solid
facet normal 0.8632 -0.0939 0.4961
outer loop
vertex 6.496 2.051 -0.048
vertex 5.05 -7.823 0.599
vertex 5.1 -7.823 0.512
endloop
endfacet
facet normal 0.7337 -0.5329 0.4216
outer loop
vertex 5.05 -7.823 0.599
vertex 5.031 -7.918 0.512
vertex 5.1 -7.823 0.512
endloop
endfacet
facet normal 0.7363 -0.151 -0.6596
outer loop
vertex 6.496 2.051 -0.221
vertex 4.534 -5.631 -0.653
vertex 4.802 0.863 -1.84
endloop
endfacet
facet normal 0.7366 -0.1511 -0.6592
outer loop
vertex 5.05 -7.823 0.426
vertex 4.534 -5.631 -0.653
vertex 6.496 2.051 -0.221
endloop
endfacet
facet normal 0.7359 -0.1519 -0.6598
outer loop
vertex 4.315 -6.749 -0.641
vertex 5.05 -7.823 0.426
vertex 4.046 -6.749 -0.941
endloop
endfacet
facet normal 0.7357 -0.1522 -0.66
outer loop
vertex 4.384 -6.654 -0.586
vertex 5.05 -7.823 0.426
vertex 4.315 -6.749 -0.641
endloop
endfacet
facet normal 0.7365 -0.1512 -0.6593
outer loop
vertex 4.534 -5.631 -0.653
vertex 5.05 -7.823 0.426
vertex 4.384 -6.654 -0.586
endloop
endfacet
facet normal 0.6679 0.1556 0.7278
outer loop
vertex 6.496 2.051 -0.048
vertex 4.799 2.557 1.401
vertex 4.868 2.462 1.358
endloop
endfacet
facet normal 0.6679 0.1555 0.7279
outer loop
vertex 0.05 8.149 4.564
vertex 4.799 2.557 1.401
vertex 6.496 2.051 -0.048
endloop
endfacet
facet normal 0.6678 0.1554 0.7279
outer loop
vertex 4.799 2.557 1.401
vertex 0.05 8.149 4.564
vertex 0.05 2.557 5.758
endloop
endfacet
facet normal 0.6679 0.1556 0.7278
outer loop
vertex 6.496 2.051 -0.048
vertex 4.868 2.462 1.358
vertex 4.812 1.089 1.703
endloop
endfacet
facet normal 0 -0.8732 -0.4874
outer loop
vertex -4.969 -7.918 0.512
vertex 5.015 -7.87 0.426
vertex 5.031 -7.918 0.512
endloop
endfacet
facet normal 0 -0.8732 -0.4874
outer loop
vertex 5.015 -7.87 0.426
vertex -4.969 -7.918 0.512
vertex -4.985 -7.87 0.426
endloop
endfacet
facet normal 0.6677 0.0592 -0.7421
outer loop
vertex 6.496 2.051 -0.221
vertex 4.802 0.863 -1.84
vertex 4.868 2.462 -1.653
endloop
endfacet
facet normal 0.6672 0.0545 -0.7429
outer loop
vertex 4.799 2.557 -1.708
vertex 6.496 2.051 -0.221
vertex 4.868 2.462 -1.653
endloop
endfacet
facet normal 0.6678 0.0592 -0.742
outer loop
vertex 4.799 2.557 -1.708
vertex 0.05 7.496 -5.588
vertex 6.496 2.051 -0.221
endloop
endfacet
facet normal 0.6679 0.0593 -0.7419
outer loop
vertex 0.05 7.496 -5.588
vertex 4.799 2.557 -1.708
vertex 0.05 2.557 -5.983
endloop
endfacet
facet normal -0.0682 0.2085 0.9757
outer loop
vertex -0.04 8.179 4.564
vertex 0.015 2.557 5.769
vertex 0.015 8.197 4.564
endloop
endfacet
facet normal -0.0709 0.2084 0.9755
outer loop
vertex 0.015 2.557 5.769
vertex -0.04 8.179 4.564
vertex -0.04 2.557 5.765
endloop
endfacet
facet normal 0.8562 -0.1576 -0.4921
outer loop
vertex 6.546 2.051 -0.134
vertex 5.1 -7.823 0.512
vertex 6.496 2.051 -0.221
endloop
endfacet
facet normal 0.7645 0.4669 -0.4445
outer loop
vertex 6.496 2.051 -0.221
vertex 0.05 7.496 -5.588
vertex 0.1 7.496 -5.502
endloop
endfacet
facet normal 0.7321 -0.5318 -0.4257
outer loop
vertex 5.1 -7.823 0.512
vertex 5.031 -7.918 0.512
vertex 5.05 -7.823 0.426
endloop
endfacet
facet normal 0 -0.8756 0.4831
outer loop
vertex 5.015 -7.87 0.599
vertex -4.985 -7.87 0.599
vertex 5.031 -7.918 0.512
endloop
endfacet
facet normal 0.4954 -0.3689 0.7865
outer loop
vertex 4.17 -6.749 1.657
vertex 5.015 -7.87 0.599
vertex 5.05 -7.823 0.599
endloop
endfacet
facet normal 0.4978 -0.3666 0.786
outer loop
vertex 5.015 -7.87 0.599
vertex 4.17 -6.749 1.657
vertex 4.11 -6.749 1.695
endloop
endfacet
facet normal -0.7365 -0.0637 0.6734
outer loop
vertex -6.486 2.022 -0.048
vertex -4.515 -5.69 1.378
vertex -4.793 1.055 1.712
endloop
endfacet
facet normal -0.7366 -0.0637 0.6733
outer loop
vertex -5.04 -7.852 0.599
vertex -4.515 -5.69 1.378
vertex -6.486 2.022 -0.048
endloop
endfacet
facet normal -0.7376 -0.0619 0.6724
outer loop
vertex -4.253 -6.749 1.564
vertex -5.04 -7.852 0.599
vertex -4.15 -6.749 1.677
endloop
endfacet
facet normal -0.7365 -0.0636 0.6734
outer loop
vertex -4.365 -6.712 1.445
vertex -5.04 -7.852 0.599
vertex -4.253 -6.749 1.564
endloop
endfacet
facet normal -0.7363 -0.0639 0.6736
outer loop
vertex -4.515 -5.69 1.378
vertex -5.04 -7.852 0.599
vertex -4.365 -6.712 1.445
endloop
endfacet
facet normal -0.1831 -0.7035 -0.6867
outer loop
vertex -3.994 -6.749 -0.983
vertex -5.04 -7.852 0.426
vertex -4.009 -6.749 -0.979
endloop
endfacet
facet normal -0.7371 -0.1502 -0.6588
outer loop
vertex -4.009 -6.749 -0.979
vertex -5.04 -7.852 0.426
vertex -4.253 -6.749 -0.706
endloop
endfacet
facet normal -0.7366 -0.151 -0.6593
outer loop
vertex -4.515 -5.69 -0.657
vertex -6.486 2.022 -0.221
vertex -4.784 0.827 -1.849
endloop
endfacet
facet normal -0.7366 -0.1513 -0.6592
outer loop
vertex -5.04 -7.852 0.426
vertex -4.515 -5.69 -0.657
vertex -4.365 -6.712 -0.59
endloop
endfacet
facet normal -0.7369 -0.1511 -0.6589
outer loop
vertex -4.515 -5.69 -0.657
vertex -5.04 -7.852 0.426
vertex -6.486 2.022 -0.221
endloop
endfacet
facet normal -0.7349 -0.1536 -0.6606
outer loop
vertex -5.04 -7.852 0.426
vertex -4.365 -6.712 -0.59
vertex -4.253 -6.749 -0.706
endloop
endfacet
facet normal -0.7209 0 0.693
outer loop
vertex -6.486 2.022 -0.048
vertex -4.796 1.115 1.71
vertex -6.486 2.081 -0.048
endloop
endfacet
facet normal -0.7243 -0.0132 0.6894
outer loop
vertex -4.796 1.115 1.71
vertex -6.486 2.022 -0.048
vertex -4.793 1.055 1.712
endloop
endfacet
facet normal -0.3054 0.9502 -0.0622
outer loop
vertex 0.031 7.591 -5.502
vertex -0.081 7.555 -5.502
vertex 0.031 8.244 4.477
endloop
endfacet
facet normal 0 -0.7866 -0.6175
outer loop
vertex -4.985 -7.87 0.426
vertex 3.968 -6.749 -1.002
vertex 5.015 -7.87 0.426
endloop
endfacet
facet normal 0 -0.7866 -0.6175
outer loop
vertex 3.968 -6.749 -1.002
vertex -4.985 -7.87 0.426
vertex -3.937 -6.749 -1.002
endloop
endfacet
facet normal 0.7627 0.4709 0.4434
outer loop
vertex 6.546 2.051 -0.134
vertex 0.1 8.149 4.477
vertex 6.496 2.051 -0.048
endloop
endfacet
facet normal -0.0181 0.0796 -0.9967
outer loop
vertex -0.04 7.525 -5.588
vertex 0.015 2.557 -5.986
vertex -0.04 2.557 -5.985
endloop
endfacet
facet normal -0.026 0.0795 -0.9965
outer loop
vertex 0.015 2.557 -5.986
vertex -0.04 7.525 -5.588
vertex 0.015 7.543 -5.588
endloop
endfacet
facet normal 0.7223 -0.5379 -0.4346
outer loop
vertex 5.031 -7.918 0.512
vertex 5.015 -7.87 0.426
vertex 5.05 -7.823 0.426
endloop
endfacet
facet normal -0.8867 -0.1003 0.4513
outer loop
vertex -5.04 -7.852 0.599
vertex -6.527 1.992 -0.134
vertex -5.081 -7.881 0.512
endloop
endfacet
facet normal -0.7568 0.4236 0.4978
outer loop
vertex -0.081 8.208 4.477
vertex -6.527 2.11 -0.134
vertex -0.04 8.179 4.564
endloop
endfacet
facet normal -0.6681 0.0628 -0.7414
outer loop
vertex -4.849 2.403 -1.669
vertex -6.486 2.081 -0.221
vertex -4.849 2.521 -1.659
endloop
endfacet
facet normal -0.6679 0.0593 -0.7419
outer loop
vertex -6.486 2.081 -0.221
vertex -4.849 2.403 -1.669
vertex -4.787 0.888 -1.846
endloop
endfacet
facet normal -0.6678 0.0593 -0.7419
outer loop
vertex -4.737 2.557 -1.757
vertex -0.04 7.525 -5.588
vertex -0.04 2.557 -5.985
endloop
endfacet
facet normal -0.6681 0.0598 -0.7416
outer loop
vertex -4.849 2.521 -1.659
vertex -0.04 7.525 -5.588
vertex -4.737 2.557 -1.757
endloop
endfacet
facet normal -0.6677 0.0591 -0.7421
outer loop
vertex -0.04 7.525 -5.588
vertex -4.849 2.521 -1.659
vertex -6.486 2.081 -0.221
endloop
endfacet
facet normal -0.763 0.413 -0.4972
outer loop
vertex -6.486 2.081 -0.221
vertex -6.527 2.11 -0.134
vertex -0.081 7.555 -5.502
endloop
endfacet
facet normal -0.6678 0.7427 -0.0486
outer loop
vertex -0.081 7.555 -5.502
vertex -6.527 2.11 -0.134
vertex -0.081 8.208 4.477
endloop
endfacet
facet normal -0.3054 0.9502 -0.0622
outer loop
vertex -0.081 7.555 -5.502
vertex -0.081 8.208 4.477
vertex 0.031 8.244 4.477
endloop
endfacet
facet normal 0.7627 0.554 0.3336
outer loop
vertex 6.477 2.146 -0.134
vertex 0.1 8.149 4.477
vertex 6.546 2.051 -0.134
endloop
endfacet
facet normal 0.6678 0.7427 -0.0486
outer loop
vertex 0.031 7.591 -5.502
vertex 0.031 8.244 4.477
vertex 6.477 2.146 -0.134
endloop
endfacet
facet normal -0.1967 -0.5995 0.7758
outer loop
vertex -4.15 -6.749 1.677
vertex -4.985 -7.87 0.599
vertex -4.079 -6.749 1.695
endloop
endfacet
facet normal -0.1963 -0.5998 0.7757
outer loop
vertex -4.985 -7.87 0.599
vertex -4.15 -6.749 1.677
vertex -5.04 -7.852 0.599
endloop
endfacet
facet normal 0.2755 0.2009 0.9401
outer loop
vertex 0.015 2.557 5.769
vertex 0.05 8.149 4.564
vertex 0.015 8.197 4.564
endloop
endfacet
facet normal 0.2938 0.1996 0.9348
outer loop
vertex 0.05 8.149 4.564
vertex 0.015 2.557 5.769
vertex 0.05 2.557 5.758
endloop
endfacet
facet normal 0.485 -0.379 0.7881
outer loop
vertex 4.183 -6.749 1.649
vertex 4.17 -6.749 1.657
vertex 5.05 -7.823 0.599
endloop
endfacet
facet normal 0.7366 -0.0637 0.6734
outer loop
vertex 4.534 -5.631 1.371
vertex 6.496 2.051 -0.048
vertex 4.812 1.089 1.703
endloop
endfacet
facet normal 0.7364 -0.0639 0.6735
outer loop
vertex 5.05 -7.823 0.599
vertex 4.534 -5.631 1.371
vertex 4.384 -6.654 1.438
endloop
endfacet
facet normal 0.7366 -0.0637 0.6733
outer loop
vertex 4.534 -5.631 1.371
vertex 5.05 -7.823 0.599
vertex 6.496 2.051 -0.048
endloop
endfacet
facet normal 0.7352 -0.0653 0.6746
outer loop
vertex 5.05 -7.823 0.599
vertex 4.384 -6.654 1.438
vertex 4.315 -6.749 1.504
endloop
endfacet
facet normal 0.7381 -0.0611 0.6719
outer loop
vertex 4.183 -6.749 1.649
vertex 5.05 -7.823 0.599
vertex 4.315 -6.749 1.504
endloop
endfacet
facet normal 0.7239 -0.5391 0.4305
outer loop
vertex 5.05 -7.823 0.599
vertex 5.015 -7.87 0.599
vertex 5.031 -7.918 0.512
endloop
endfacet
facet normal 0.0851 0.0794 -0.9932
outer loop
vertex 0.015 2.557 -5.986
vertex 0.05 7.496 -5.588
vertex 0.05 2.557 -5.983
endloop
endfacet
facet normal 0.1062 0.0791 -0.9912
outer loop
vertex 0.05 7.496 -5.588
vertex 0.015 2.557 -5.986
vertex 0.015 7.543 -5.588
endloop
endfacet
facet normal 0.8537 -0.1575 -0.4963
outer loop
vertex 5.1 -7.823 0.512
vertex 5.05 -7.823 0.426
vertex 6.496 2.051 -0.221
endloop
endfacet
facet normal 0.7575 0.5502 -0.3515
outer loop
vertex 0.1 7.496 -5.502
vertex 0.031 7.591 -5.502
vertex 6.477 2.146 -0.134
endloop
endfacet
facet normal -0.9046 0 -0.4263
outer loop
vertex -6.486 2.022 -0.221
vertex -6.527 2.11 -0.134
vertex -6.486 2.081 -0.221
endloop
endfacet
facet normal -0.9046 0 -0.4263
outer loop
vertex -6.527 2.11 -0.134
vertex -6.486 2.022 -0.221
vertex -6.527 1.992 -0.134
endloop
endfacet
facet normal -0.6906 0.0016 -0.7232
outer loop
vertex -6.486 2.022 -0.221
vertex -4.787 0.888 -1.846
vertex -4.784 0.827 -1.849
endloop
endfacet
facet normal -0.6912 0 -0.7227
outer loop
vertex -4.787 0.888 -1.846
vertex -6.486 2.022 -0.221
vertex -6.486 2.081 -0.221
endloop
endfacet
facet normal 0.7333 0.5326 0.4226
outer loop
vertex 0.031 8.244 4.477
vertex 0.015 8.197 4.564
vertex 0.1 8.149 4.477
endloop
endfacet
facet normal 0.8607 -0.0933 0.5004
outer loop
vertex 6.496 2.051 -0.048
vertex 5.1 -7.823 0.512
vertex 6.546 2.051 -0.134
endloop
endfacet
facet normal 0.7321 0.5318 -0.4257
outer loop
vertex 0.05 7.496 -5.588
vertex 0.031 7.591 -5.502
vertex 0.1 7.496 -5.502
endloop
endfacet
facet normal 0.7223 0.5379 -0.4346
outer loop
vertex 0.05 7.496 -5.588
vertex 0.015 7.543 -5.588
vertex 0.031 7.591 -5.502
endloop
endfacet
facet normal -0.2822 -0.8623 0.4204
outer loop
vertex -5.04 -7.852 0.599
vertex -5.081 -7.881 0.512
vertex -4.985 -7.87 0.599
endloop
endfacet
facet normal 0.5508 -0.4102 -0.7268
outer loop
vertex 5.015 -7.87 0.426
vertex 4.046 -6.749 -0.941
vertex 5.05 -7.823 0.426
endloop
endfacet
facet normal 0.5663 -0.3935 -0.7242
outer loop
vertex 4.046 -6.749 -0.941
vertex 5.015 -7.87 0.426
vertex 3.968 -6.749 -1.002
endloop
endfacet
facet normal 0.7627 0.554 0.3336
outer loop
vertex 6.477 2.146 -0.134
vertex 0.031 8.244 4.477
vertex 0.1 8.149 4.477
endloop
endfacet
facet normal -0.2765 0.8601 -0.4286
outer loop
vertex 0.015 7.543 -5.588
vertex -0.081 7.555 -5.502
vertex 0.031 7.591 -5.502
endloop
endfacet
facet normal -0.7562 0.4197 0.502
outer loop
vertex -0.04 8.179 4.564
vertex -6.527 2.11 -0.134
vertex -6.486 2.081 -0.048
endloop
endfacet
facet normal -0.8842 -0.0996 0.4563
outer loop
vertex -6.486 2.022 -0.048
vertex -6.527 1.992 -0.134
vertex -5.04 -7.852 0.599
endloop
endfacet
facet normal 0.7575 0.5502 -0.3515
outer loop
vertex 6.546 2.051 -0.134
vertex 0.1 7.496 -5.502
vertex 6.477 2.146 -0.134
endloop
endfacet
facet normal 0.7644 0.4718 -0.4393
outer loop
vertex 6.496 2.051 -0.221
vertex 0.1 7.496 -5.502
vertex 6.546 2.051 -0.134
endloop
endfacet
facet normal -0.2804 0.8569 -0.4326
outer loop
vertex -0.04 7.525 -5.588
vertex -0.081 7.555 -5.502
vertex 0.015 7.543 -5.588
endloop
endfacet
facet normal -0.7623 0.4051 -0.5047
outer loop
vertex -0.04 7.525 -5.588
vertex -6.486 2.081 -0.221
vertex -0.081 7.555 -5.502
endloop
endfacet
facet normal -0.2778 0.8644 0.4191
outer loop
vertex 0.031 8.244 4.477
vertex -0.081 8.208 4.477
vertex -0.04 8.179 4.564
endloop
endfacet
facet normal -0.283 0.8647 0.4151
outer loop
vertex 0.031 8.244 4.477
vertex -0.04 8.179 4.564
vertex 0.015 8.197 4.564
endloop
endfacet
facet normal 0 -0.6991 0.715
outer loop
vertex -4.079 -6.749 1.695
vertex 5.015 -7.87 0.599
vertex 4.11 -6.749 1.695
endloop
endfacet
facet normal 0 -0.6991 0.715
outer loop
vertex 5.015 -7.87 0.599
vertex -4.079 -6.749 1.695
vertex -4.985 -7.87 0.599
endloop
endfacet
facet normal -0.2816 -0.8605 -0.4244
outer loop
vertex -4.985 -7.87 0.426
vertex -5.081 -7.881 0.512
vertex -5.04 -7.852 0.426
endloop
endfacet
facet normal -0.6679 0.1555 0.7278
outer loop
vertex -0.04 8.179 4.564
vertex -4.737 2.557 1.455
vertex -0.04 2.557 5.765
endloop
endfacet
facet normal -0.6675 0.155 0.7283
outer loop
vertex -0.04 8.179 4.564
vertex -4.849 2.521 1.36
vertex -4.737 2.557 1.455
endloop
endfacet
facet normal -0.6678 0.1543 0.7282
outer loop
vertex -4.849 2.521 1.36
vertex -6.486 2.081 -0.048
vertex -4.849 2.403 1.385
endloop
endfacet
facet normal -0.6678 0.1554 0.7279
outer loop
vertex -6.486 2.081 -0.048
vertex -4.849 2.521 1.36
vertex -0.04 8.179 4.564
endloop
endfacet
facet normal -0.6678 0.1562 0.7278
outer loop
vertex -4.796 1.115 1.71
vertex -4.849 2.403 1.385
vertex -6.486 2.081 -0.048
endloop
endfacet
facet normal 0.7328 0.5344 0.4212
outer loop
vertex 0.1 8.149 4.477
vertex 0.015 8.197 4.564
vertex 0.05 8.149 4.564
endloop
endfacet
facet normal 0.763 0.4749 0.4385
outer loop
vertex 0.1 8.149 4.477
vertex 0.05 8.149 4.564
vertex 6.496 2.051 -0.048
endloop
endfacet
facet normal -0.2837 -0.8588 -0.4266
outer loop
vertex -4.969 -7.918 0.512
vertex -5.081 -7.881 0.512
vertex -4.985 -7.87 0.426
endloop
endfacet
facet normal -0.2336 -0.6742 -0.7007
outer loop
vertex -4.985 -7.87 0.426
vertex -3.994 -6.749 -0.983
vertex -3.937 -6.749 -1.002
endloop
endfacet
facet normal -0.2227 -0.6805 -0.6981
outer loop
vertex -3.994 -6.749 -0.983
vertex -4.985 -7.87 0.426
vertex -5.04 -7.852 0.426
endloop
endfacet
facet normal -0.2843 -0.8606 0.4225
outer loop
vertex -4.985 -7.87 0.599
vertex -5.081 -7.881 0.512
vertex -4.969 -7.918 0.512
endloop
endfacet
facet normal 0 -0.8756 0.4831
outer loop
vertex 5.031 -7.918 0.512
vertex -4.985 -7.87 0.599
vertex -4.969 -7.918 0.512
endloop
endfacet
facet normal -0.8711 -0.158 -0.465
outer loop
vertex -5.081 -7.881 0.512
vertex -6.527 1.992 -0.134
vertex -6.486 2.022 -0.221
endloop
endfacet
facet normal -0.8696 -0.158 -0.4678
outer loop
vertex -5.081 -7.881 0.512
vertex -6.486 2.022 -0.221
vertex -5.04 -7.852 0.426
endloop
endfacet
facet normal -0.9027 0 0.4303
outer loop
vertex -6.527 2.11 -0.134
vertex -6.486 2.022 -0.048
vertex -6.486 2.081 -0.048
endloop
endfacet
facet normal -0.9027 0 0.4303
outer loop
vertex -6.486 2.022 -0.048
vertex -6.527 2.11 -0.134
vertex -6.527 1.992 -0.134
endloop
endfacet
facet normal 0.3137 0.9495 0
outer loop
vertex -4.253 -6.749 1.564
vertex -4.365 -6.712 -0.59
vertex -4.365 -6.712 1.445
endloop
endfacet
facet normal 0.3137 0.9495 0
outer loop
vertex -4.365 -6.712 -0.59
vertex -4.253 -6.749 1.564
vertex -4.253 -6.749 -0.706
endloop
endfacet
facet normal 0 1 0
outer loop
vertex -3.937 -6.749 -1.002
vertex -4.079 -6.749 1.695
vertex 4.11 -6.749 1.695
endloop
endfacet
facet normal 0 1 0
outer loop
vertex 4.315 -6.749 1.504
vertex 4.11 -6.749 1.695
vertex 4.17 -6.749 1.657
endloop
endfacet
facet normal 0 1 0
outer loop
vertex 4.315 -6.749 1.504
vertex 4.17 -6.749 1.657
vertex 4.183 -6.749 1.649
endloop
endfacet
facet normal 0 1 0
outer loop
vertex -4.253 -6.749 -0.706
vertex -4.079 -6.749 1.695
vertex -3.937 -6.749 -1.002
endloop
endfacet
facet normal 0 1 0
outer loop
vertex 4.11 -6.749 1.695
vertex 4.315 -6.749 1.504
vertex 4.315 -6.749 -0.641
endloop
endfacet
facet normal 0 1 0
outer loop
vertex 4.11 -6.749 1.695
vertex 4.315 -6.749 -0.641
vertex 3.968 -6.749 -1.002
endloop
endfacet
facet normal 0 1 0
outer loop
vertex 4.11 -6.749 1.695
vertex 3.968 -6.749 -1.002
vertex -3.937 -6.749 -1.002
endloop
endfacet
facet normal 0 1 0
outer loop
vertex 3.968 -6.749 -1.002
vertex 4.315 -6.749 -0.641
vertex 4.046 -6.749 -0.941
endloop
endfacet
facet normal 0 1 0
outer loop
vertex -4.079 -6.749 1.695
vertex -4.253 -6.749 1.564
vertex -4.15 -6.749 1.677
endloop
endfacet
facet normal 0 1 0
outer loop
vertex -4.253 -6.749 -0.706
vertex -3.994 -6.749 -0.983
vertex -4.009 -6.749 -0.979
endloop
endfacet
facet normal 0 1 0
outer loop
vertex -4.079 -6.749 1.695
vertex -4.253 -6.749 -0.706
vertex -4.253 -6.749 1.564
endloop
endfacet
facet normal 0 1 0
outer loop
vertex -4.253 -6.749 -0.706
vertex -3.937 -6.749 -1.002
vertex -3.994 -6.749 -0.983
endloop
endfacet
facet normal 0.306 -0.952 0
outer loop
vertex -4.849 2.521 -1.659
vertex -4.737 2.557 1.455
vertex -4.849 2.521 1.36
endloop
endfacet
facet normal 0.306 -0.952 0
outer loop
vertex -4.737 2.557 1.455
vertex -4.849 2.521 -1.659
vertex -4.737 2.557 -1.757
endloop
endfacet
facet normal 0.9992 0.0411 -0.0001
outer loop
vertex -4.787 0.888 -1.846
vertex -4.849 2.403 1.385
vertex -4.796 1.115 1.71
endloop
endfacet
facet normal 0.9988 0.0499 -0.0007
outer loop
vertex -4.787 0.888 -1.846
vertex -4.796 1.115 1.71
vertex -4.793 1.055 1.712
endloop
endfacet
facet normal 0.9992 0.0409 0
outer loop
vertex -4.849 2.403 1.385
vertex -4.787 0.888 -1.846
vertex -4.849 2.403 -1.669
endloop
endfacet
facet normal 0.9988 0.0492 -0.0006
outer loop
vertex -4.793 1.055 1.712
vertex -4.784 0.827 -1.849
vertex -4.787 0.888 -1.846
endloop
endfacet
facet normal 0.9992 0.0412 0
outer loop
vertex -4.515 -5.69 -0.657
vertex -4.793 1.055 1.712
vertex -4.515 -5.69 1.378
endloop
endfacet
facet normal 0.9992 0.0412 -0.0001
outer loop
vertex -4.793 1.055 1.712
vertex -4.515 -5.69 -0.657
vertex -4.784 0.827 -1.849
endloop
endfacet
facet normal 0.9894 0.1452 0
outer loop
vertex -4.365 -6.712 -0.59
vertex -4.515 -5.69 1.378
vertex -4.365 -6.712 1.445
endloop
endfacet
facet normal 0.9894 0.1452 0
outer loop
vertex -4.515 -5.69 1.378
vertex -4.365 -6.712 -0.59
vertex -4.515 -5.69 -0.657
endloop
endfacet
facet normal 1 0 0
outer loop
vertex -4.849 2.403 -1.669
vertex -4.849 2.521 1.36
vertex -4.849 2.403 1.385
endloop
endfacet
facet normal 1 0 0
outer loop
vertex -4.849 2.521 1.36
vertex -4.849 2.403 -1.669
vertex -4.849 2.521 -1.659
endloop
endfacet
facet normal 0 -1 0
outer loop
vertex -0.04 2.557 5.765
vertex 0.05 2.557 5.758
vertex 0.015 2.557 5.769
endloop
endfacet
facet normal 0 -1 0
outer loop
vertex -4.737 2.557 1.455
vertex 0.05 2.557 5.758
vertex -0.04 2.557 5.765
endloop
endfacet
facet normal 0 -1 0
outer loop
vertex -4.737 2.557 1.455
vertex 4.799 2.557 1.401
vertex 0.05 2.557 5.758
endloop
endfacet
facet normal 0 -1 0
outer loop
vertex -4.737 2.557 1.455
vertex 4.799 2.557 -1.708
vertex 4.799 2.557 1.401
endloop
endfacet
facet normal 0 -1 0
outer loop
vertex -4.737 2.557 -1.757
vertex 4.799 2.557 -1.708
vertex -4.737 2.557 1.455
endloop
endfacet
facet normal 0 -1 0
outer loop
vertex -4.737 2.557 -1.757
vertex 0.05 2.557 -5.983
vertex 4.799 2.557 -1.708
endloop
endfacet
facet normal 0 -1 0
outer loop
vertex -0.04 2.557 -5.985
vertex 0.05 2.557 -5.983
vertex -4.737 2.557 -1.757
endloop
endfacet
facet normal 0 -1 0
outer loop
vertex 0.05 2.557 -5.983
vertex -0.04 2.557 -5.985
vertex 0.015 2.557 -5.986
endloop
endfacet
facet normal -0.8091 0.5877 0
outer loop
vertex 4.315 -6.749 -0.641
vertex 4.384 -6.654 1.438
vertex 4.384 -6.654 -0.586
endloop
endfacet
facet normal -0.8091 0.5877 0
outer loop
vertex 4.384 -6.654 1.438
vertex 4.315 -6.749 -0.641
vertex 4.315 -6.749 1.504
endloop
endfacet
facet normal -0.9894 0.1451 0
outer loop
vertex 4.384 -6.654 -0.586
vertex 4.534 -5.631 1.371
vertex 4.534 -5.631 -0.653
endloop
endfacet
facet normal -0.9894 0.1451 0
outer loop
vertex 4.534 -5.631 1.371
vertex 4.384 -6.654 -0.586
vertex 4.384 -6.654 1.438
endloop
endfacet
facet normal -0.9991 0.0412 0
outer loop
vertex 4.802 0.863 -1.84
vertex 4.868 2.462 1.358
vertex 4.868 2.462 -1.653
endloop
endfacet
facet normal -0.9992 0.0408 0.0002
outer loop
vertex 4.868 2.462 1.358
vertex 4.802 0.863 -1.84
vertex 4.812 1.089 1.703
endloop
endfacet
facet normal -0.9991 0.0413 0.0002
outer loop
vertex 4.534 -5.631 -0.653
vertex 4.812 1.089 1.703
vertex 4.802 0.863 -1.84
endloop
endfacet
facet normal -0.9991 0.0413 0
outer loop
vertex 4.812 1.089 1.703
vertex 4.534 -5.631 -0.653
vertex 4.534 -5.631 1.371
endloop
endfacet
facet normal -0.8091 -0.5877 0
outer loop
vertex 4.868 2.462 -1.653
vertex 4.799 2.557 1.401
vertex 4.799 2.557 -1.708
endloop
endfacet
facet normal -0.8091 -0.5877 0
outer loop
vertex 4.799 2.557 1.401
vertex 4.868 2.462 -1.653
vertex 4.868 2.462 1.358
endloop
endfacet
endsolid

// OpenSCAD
// Auto-generated OpenSCAD file

    inner_points = 10*[[-0.44338942496134576, -0.5631291440797384, 0.736853897056677], [0.258799636920154, 0.14397761227363534, 0.8201038609809336], [-0.25879980510935924, 0.14397747926995844, -0.8201039287466986], [0.44338919068963584, -0.5631293267497549, -0.7368538292909121], [-0.4284186803233596, -0.6653657601513122, -0.2577935536208068], [0.47682137191431595, 0.24621402912054582, -0.1504703186366988], [-0.47682153054903015, 0.24621410252250395, 0.15047023127520603], [0.42841843649715877, -0.6653657507776369, 0.25779364098229957]];

    outer_points = 10*[[0.4999998558605856, -0.7822559369703687, 0.051219988111338946], [-0.5000001441354547, -0.7822559369703687, 0.05121717394836035], [1.5482124809305407e-06, 0.7495881473432447, -0.5501502552287388], [-1.259937611829569e-06, 0.8149237265974926, 0.4477130931690396], [0.6445843110171734, 0.20512235240503623, -0.01342867001218147], [-0.6445842354260318, 0.20512235240503623, -0.013432297942578041], [1.7722938158523331e-06, -0.2472366392743148, -0.629776537226624], [-1.8478849574399043e-06, -0.16300806553575767, 0.6566375051813835]];

    // Convex hull for inner set (I)
    module inner_hull() {
        hull() {
            for (p = inner_points) {
                translate(p) sphere(r=0.1);
            }
        }
    }

    // Convex hull for outer set (O) minus inner hull (O \ I)
    module outer_minus_inner() {
        difference() {
            hull() {
                for (p = outer_points) {
                    translate(p) sphere(r=0.1);
                }
            }
            inner_hull(); // Subtract inner hull
        }
    }

    // Convex hull for outer set (O) minus all translated inner hulls
    module outer_minus_AllTranslationInner() {
        difference() {
            hull() {
                for (p = outer_points) {
                    translate(p) sphere(r=0.1);
                }
            }
            hull() {
                translate([0,0,50]) inner_hull();
                translate([0,0,-50]) inner_hull();
            }; // Subtract translated inner hulls
        }
    }

    // Difference between outer_minus_inner and outer_minus_AllTranslationInner
    module outer_minus_inner_diff() {
        difference() {
            // Outer minus inner
            difference() {
                hull() {
                    for (p = outer_points) {
                        translate(p) sphere(r=0.1);
                    }
                }
                inner_hull();
            }

            // Subtract Outer minus AllTranslationInner
            difference() {
                hull() {
                    for (p = outer_points) {
                        translate(p) sphere(r=0.1);
                    }
                }
                hull() {
                    translate([0,0,50]) inner_hull();
                    translate([0,0,-50]) inner_hull();
                };
            }
        }
    }

    // Rendering all with colors applied
    color([0, 1, 0, 1]) outer_minus_AllTranslationInner(); // Opaque green
    
